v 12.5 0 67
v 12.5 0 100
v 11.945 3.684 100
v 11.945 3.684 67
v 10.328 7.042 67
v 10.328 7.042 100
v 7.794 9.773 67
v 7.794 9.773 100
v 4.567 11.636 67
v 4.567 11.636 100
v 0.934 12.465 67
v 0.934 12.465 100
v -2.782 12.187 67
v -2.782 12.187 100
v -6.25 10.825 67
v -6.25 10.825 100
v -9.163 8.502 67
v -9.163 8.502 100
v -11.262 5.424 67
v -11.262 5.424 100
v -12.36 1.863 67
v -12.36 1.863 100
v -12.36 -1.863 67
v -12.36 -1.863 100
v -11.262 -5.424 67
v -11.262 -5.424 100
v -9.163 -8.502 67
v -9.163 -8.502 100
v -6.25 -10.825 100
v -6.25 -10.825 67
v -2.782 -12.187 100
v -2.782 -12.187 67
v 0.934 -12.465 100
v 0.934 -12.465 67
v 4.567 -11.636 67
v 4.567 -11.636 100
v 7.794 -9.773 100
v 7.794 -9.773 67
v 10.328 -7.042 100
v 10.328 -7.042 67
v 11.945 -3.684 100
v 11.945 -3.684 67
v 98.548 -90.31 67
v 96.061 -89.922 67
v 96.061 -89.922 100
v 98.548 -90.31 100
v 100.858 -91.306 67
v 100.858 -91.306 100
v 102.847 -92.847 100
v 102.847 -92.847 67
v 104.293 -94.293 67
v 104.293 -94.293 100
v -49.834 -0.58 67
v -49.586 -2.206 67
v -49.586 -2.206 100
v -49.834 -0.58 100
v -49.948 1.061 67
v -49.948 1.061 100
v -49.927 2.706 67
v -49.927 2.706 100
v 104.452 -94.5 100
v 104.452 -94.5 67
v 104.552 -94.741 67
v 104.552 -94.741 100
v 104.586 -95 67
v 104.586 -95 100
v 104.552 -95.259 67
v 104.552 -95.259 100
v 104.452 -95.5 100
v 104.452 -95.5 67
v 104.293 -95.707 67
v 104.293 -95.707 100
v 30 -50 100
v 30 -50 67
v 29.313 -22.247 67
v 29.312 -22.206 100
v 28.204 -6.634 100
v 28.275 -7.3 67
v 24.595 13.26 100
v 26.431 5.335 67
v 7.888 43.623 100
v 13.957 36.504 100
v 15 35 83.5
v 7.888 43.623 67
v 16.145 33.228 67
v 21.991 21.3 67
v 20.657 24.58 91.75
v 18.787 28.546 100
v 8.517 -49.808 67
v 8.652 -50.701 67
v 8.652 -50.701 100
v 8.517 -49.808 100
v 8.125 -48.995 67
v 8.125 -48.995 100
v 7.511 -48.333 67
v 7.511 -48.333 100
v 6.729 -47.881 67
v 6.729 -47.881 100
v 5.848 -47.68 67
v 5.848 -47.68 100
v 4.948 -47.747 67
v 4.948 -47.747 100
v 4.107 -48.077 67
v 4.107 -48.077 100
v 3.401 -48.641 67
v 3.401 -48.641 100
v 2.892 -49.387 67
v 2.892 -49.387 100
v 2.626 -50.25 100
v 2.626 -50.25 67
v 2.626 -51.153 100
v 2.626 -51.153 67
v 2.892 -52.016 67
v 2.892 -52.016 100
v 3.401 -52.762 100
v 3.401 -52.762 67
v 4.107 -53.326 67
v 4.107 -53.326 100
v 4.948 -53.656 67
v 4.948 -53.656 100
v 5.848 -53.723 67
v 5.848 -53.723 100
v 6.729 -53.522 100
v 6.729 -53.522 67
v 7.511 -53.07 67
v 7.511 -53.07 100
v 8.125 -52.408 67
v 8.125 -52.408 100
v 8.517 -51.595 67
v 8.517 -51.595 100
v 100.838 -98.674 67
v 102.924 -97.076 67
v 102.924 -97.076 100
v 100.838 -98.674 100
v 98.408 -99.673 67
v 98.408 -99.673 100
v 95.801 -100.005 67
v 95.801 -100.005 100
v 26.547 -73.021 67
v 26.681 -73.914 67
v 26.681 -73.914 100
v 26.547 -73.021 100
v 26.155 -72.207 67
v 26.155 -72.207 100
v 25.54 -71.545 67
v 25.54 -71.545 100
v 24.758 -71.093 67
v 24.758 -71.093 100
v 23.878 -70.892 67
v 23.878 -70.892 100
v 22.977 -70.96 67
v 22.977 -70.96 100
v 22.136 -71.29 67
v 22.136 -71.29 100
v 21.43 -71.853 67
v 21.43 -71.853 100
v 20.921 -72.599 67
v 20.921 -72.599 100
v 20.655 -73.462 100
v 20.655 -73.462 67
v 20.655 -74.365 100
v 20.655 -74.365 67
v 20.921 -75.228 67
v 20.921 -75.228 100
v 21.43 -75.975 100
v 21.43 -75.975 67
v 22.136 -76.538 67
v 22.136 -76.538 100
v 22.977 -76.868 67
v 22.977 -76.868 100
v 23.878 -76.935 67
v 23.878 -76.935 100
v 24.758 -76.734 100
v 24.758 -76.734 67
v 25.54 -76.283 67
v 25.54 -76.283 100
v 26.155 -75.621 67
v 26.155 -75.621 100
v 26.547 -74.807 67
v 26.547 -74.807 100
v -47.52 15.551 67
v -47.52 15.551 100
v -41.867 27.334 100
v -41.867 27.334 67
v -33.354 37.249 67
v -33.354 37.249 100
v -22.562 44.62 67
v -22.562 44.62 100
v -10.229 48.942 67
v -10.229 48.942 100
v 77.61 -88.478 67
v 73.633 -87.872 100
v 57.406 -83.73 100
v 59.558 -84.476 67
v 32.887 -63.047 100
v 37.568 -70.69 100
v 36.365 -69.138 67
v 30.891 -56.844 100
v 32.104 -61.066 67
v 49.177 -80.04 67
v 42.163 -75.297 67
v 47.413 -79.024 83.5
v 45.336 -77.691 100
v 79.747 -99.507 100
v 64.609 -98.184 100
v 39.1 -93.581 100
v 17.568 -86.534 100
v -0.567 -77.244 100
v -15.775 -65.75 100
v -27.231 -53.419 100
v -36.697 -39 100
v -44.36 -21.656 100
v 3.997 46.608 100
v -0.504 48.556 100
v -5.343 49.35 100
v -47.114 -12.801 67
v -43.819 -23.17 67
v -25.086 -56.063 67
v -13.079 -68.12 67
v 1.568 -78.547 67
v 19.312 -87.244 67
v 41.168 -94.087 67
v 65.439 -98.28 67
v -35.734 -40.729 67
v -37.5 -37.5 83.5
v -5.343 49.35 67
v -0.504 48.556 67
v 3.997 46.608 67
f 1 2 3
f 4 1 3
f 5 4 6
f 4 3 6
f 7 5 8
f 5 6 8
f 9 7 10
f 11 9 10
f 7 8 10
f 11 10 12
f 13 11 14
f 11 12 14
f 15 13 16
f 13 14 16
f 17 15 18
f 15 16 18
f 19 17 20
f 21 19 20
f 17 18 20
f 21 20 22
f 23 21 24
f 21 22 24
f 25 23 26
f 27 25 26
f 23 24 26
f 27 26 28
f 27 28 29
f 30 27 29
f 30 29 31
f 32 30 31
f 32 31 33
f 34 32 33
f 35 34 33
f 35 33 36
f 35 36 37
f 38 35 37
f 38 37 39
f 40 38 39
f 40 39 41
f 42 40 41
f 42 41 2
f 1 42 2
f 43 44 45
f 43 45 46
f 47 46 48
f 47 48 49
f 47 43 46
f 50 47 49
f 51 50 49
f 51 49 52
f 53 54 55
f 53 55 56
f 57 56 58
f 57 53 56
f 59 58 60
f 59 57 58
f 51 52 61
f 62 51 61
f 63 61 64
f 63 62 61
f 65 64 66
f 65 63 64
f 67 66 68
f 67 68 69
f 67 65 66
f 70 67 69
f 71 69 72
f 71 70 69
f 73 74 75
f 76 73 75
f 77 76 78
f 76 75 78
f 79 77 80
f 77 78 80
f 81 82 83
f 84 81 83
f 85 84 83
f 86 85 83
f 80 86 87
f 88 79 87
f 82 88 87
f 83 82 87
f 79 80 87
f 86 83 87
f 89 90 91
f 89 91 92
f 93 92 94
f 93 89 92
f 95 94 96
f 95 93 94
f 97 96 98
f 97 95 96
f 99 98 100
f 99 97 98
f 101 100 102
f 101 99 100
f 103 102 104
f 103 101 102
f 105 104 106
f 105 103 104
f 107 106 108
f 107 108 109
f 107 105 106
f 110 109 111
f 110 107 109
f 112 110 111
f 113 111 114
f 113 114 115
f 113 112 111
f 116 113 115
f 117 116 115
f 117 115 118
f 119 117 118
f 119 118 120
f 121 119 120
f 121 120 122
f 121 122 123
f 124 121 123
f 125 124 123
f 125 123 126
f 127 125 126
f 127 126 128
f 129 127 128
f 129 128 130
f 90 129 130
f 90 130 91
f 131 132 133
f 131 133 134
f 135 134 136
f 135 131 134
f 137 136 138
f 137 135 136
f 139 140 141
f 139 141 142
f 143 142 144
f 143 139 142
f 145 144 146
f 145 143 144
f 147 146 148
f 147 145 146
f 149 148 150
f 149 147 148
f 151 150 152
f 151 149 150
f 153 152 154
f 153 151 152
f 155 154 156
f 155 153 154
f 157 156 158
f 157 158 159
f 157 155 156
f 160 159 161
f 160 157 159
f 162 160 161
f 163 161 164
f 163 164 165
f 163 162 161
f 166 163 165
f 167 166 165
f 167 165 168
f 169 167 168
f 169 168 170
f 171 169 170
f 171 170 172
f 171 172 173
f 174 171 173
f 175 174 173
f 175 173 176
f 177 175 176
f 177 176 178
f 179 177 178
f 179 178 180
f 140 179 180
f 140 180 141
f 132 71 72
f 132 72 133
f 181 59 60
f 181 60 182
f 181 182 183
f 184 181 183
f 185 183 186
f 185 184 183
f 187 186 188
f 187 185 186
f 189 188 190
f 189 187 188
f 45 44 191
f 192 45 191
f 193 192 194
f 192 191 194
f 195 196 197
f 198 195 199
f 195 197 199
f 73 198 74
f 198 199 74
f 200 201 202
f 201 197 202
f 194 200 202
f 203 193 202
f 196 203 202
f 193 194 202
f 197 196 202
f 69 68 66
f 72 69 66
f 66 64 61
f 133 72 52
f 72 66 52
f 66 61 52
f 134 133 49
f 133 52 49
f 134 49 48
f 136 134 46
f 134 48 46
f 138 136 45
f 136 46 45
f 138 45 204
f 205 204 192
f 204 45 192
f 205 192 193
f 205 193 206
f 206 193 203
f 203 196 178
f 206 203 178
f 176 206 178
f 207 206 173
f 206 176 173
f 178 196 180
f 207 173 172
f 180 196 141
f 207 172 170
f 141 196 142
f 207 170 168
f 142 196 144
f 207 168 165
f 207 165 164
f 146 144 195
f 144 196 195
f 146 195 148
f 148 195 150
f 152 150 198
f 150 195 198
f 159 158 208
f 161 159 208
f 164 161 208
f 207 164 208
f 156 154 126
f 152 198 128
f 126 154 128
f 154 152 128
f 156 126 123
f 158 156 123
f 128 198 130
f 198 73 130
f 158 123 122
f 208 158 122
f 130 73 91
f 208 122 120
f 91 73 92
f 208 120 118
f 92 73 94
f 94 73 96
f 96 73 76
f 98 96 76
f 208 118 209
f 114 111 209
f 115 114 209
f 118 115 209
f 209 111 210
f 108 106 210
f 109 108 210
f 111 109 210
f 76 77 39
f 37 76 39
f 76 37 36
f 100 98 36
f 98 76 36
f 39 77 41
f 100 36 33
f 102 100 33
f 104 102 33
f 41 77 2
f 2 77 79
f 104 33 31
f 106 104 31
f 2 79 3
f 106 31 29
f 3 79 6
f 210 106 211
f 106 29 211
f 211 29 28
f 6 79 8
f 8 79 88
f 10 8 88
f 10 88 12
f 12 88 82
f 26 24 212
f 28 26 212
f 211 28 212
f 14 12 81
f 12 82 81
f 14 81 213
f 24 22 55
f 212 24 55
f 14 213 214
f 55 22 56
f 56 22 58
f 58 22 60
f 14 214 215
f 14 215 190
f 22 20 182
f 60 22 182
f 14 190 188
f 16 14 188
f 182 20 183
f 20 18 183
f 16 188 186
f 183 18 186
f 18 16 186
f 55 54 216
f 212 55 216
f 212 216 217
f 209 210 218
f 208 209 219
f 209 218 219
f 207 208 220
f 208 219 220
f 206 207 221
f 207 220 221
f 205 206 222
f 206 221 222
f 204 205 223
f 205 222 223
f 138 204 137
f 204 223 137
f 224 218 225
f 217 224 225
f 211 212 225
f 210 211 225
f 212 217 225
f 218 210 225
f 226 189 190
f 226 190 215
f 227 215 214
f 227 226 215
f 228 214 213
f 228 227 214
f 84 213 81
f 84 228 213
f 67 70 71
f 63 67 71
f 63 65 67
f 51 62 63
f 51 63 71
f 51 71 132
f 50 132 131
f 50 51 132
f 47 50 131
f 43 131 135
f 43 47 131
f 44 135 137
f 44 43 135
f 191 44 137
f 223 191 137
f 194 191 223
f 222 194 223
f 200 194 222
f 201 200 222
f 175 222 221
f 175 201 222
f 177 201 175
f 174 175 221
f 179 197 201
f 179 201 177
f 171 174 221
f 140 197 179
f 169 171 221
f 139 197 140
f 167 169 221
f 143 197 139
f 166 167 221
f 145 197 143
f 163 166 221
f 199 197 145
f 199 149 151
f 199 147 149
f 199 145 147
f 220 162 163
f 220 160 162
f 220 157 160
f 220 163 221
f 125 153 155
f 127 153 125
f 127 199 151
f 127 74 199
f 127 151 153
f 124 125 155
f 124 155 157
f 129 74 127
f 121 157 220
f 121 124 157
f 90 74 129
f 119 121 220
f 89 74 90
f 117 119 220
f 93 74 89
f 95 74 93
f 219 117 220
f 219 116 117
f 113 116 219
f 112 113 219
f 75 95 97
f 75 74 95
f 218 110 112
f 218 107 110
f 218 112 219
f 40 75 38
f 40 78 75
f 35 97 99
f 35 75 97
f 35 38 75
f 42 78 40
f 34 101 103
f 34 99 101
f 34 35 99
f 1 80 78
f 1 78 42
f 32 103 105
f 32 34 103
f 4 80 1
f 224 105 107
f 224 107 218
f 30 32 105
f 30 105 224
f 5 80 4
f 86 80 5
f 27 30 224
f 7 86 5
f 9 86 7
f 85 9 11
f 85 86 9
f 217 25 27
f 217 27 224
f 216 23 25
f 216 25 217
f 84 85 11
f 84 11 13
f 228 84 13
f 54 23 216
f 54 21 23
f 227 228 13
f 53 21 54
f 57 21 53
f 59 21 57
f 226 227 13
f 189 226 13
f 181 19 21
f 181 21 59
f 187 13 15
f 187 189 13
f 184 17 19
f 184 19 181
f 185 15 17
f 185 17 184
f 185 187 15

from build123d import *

# Parameters (mm, degrees)
CROQUIS1_R              = 10
SALIENTE_EXTRUIR1_DEPTH = 100
CORTAR_EXTRUIR4_DEPTH   = 15
CROQUIS3_W              = 244.799963401
CROQUIS3_H              = 159.784694376
CORTAR_EXTRUIR5_DEPTH   = 35
CAVIDAD1_START          = 35
CAVIDAD1_OUTLINE_R      = 3.03
CAVIDAD1_DEPTH          = 65
CROQUIS4_R              = 12.5
CORTAR_EXTRUIR6_DEPTH   = 65
CROQUIS5_W              = 213.058099932
CROQUIS5_H              = 195.665601979
CORTAR_EXTRUIR7_DEPTH   = 32


# Read off the part's stored shape, not the designer's step: Cavidad1
with BuildPart() as part:
    # Croquis1 → Saliente-Extruir1 (new body)
    with BuildSketch(Plane.XY):
        with BuildLine():
            Line((102.84709295, -92.84709295), (104.292893219, -94.292893219))
            ThreePointArc((104.292893219, -94.292893219), (104.585786438, -95), (104.292893219, -95.707106781))
            Line((104.292893219, -95.707106781), (102.924090823, -97.075909177))
            ThreePointArc((102.924090823, -97.075909177), (99.655924863, -99.253513567), (95.801242309, -100.004707302))
            add(Edge.make_bspline(
                [(-49.58600728, -2.205776949), (-47.044709507, -15.23286343), (-27.045253615, -73.563310407), (28.636670051, -99.656919769), (95.801242309, -100.004707302)],
                knots=[0.011039812, 0.011039812, 0.011039812, 0.011039812, 0.207725041, 0.983937689, 0.983937689, 0.983937689, 0.983937689], degree=3))
            ThreePointArc((-49.58600728, -2.205776949), (-49.90808847, 0.239585929), (-49.92672205, 2.705998037))
            ThreePointArc((-49.92672205, 2.705998037), (-37.935964584, 32.570885635), (-10.229250857, 48.942439936))
            ThreePointArc((-10.229250857, 48.942439936), (-0.503550938, 48.555514737), (7.88775097, 43.623476385))
            add(Edge.make_bspline(
                [(30, -50), (29.065577858, -23.91659264), (31.451883129, 15.353668912), (10.5535399, 41.001196903), (7.88775097, 43.623476385)],
                knots=[0, 0, 0, 0, 0.805376889, 0.908560603, 0.908560603, 0.908560603, 0.908560603], degree=3))
            add(Edge.make_bspline(
                [(96.061432126, -89.922234449), (74.639632489, -89.310592156), (42.207594165, -82.045244121), (30.598677739, -62.69576919), (30, -50)],
                knots=[0.027764728, 0.027764728, 0.027764728, 0.027764728, 0.487449894, 0.947135059, 0.947135059, 0.947135059, 0.947135059], degree=3))
            ThreePointArc((96.061432126, -89.922234449), (99.734323975, -90.734922209), (102.84709295, -92.84709295))
        make_face()
        Circle(CROQUIS1_R, mode=Mode.SUBTRACT)
    extrude(amount=SALIENTE_EXTRUIR1_DEPTH)

    # Croquis2 → Cortar-Extruir4 (cut)
    with BuildSketch(Plane(origin=(0, 0, 0), x_dir=(-1, 0, 0), z_dir=(0, 0, -1))):
        with BuildLine():
            ThreePointArc((1.102623365, 39.984799883), (1.653330869, 39.965816607), (2.203724614, 39.939248839))
            ThreePointArc((2.203724614, 39.939248839), (3.208029629, 37.678468026), (3.853201686, 35.290265468))
            ThreePointArc((3.853201686, 35.290265468), (4.391380959, 35.227344113), (4.928537187, 35.156215968))
            ThreePointArc((4.928537187, 35.156215968), (6.140272041, 37.312939662), (7.668866774, 39.257973488))
            ThreePointArc((7.668866774, 39.257973488), (8.208938801, 39.148605643), (8.747452981, 39.031808392))
            ThreePointArc((8.747452981, 39.031808392), (9.365948293, 36.63655851), (9.609235823, 34.174736091))
            ThreePointArc((9.609235823, 34.174736091), (10.129718517, 34.024091505), (10.647841327, 33.865520446))
            ThreePointArc((10.647841327, 33.865520446), (12.198034749, 35.793384238), (14.025923488, 37.460291914))
            ThreePointArc((14.025923488, 37.460291914), (14.540628281, 37.263522769), (15.052573634, 37.05968196))
            ThreePointArc((15.052573634, 37.05968196), (15.268388303, 34.595299183), (15.103155055, 32.127009001))
            ThreePointArc((15.103155055, 32.127009001), (15.591743761, 31.892750375), (16.076700112, 31.651061807))
            ThreePointArc((16.076700112, 31.651061807), (17.923066867, 33.297478598), (20.000389573, 34.640791229))
            ThreePointArc((20.000389573, 34.640791229), (20.475687326, 34.361988134), (20.947099317, 34.076664012))
            ThreePointArc((20.947099317, 34.076664012), (20.754346482, 31.610370276), (20.18509959, 29.202940855))
            ThreePointArc((20.18509959, 29.202940855), (20.628466879, 28.891458153), (21.067028427, 28.57324471))
            ThreePointArc((21.067028427, 28.57324471), (23.159204443, 29.893304542), (25.429297167, 30.87638006))
            ThreePointArc((25.429297167, 30.87638006), (25.852222997, 30.523148037), (26.270242736, 30.164123501))
            ThreePointArc((26.270242736, 30.164123501), (25.674180192, 27.763192871), (24.716447225, 25.482292608))
            ThreePointArc((24.716447225, 25.482292608), (25.102499195, 25.102082267), (25.482703124, 24.716023982))
            ThreePointArc((25.482703124, 24.716023982), (27.763619294, 25.673719065), (30.164559823, 26.269741732))
            ThreePointArc((30.164559823, 26.269741732), (30.523577417, 25.85171603), (30.876802415, 25.428784332))
            ThreePointArc((30.876802415, 25.428784332), (29.893689193, 23.158707937), (28.573594612, 21.066553846))
            ThreePointArc((28.573594612, 21.066553846), (28.891800771, 20.627987013), (29.203276108, 20.18461455))
            ThreePointArc((29.203276108, 20.18461455), (31.610714984, 20.753821458), (34.077011921, 20.94653333))
            ThreePointArc((34.077011921, 20.94653333), (34.362328213, 20.4751166), (34.641123413, 19.999814215))
            ThreePointArc((34.641123413, 19.999814215), (33.297776281, 17.922513822), (31.651328823, 16.076174412))
            ThreePointArc((31.651328823, 16.076174412), (31.893009337, 15.591214047), (32.127259848, 15.102621451))
            ThreePointArc((32.127259848, 15.102621451), (34.595552773, 15.267813702), (37.059931966, 15.051958102))
            ThreePointArc((37.059931966, 15.051958102), (37.263764272, 14.540009363), (37.460524868, 14.025301302))
            ThreePointArc((37.460524868, 14.025301302), (35.793586832, 12.197440249), (33.865697293, 10.647278847))
            ThreePointArc((33.865697293, 10.647278847), (34.024259747, 10.129153404), (34.174895688, 9.608668207))
            ThreePointArc((34.174895688, 9.608668207), (36.636714066, 9.365339789), (39.031953674, 8.746804694))
            ThreePointArc((39.031953674, 8.746804694), (39.148741981, 8.208288574), (39.258100856, 7.668214731))
            ThreePointArc((39.258100856, 7.668214731), (37.313041641, 6.139652303), (35.156297822, 4.927953271))
            ThreePointArc((35.156297822, 4.927953271), (35.227417046, 4.390795861), (35.290329461, 3.852615543))
            ThreePointArc((35.290329461, 3.852615543), (37.678521304, 3.20740382), (39.939285436, 2.203061256))
            ThreePointArc((39.939285436, 2.203061256), (39.965844062, 1.65266707), (39.984818192, 1.101959251))
            ThreePointArc((39.984818192, 1.101959251), (37.814693942, -0.085609353), (35.487926192, -0.925794025))
            ThreePointArc((35.487926192, -0.925794025), (35.469662238, -1.467331147), (35.443135042, -2.00852643))
            ThreePointArc((35.443135042, -2.00852643), (37.692556701, -3.038021764), (39.757177604, -4.400775951))
            ThreePointArc((39.757177604, -4.400775951), (39.692782099, -4.948034883), (39.620853919, -5.494354805))
            ThreePointArc((39.620853919, -5.494354805), (37.284859968, -6.308535809), (34.851536446, -6.754288072))
            ThreePointArc((34.851536446, -6.754288072), (34.744387508, -7.285433186), (34.629144292, -7.814881038))
            ThreePointArc((34.629144292, -7.814881038), (36.678437409, -9.200578033), (38.490597607, -10.884571461))
            ThreePointArc((38.490597607, -10.884571461), (38.337004513, -11.413767343), (38.176136036, -11.940797184))
            ThreePointArc((38.176136036, -11.940797184), (35.737992209, -12.359381853), (33.264487636, -12.398542748))
            ThreePointArc((33.264487636, -12.398542748), (33.071376458, -12.904807599), (32.870560757, -13.408066063))
            ThreePointArc((32.870560757, -13.408066063), (34.663825958, -15.112166519), (36.174094444, -17.071464236))
            ThreePointArc((36.174094444, -17.071464236), (35.935493381, -17.568161984), (35.690072679, -18.061525743))
            ThreePointArc((35.690072679, -18.061525743), (33.216285184, -18.073096179), (30.770070318, -17.704597499))
            ThreePointArc((30.770070318, -17.704597499), (30.496264469, -18.172172502), (30.215354012, -18.635513998))
            ThreePointArc((30.215354012, -18.635513998), (31.703675696, -20.611534496), (32.870856284, -22.792691969))
            ThreePointArc((32.870856284, -22.792691969), (32.553755666, -23.243342962), (32.230477177, -23.689582963))
            ThreePointArc((32.230477177, -23.689582963), (29.788524487, -23.293823554), (27.436325694, -22.527716982))
            ThreePointArc((27.436325694, -22.527716982), (27.089293883, -22.94384791), (26.735951175, -23.35463369))
            ThreePointArc((26.735951175, -23.35463369), (27.878731807, -25.548673542), (28.670986852, -27.89219448))
            ThreePointArc((28.670986852, -27.89219448), (28.284036357, -28.284506136), (27.891718275, -28.671450114))
            ThreePointArc((27.891718275, -28.671450114), (25.548210496, -27.879156145), (23.354189625, -26.736339072))
            ThreePointArc((23.354189625, -26.736339072), (22.943397976, -27.089674957), (22.527261285, -27.436699856))
            ThreePointArc((22.527261285, -27.436699856), (23.293328789, -29.788911374), (23.689047639, -32.230870636))
            ThreePointArc((23.689047639, -32.230870636), (23.242802268, -32.554141714), (22.792146008, -32.871234847))
            ThreePointArc((22.792146008, -32.871234847), (20.611007921, -31.704018032), (18.635012143, -30.215663528))
            ThreePointArc((18.635012143, -30.215663528), (18.171665982, -30.496566289), (17.704086432, -30.770364373))
            ThreePointArc((17.704086432, -30.770364373), (18.072544482, -33.216585358), (18.060932958, -35.690372661))
            ThreePointArc((18.060932958, -35.690372661), (17.567565123, -35.935785168), (17.070863412, -36.174377982))
            ThreePointArc((17.070863412, -36.174377982), (15.111590779, -34.664076954), (13.407520108, -32.870783449))
            ThreePointArc((13.407520108, -32.870783449), (12.90425831, -33.071590791), (12.397990251, -33.264693561))
            ThreePointArc((12.397990251, -33.264693561), (12.358788274, -35.738197483), (11.940163108, -38.176334357))
            ThreePointArc((11.940163108, -38.176334357), (11.413130596, -38.337194081), (10.883932163, -38.490778385))
            ThreePointArc((10.883932163, -38.490778385), (9.199968834, -36.678590218), (7.814305875, -34.629274085))
            ThreePointArc((7.814305875, -34.629274085), (7.28485611, -34.744508508), (6.753709216, -34.851648624))
            ThreePointArc((6.753709216, -34.851648624), (6.307916538, -37.284964743), (5.493696735, -39.62094517))
            ThreePointArc((5.493696735, -39.62094517), (4.947375618, -39.692864277), (4.400115616, -39.757250692))
            ThreePointArc((4.400115616, -39.757250692), (3.037395721, -37.692607155), (2.007937749, -35.443168397))
            ThreePointArc((2.007937749, -35.443168397), (1.466742025, -35.469686605), (0.9252046, -35.487941564))
            ThreePointArc((0.9252046, -35.487941564), (0.084981283, -37.814695359), (-1.102623365, -39.984799883))
            ThreePointArc((-1.102623365, -39.984799883), (-1.653330869, -39.965816607), (-2.203724614, -39.939248839))
            ThreePointArc((-2.203724614, -39.939248839), (-3.208029629, -37.678468026), (-3.853201686, -35.290265468))
            ThreePointArc((-3.853201686, -35.290265468), (-4.391380959, -35.227344113), (-4.928537187, -35.156215968))
            ThreePointArc((-4.928537187, -35.156215968), (-6.140272041, -37.312939662), (-7.668866774, -39.257973488))
            ThreePointArc((-7.668866774, -39.257973488), (-8.208938801, -39.148605643), (-8.747452981, -39.031808392))
            ThreePointArc((-8.747452981, -39.031808392), (-9.365948293, -36.63655851), (-9.609235823, -34.174736091))
            ThreePointArc((-9.609235823, -34.174736091), (-10.129718517, -34.024091505), (-10.647841327, -33.865520446))
            ThreePointArc((-10.647841327, -33.865520446), (-12.198034749, -35.793384238), (-14.025923488, -37.460291914))
            ThreePointArc((-14.025923488, -37.460291914), (-14.540628281, -37.263522769), (-15.052573634, -37.05968196))
            ThreePointArc((-15.052573634, -37.05968196), (-15.268388303, -34.595299183), (-15.103155055, -32.127009001))
            ThreePointArc((-15.103155055, -32.127009001), (-15.591743761, -31.892750375), (-16.076700112, -31.651061807))
            ThreePointArc((-16.076700112, -31.651061807), (-17.923066867, -33.297478598), (-20.000389573, -34.640791229))
            ThreePointArc((-20.000389573, -34.640791229), (-20.475687326, -34.361988134), (-20.947099317, -34.076664012))
            ThreePointArc((-20.947099317, -34.076664012), (-20.754346482, -31.610370276), (-20.18509959, -29.202940855))
            ThreePointArc((-20.18509959, -29.202940855), (-20.628466879, -28.891458153), (-21.067028427, -28.57324471))
            ThreePointArc((-21.067028427, -28.57324471), (-23.159204443, -29.893304542), (-25.429297167, -30.87638006))
            ThreePointArc((-25.429297167, -30.87638006), (-25.852222997, -30.523148037), (-26.270242736, -30.164123501))
            ThreePointArc((-26.270242736, -30.164123501), (-25.674180192, -27.763192871), (-24.716447225, -25.482292608))
            ThreePointArc((-24.716447225, -25.482292608), (-25.102499195, -25.102082267), (-25.482703124, -24.716023982))
            ThreePointArc((-25.482703124, -24.716023982), (-27.421409872, -25.555856409), (-29.453588357, -26.133916065))
            add(Edge.make_bspline(
                [(-30, -50), (-29.734872846, -42.599255467), (-29.715262914, -34.495945215), (-29.453588357, -26.133916065)],
                knots=[0, 0, 0, 0, 0.228512653, 0.228512653, 0.228512653, 0.228512653], degree=3))
            add(Edge.make_bspline(
                [(-96.061432126, -89.922234449), (-74.639632489, -89.310592156), (-42.207594165, -82.045244121), (-30.598677739, -62.69576919), (-30, -50)],
                knots=[0.027764728, 0.027764728, 0.027764728, 0.027764728, 0.487449894, 0.947135059, 0.947135059, 0.947135059, 0.947135059], degree=3))
            ThreePointArc((-96.061432126, -89.922234449), (-99.734323975, -90.734922209), (-102.84709295, -92.84709295))
            Line((-102.84709295, -92.84709295), (-104.292893219, -94.292893219))
            ThreePointArc((-104.292893219, -94.292893219), (-104.585786438, -95), (-104.292893219, -95.707106781))
            Line((-104.292893219, -95.707106781), (-102.924090823, -97.075909177))
            ThreePointArc((-102.924090823, -97.075909177), (-99.655924863, -99.253513567), (-95.801242309, -100.004707302))
            add(Edge.make_bspline(
                [(49.58600728, -2.205776949), (47.044709507, -15.23286343), (27.045253615, -73.563310407), (-28.636670051, -99.656919769), (-95.801242309, -100.004707302)],
                knots=[0.011039812, 0.011039812, 0.011039812, 0.011039812, 0.207725041, 0.983937689, 0.983937689, 0.983937689, 0.983937689], degree=3))
            ThreePointArc((49.58600728, -2.205776949), (49.90808847, 0.239585929), (49.92672205, 2.705998037))
            ThreePointArc((49.92672205, 2.705998037), (37.935964584, 32.570885635), (10.229250857, 48.942439936))
            ThreePointArc((10.229250857, 48.942439936), (0.503550938, 48.555514737), (-7.88775097, 43.623476385))
            add(Edge.make_bspline(
                [(-15.182020199, 34.727214957), (-15.121605489, 34.818294405), (-12.99668952, 38.002837294), (-10.5535399, 41.001196903), (-7.88775097, 43.623476385)],
                knots=[0.802344073, 0.802344073, 0.802344073, 0.802344073, 0.805376889, 0.908560603, 0.908560603, 0.908560603, 0.908560603], degree=3))
            ThreePointArc((-15.182020199, 34.727214957), (-14.257602386, 33.834526615), (-13.407520108, 32.870783449))
            ThreePointArc((-13.407520108, 32.870783449), (-12.90425831, 33.071590791), (-12.397990251, 33.264693561))
            ThreePointArc((-12.397990251, 33.264693561), (-12.358788274, 35.738197483), (-11.940163108, 38.176334357))
            ThreePointArc((-11.940163108, 38.176334357), (-11.413130596, 38.337194081), (-10.883932163, 38.490778385))
            ThreePointArc((-10.883932163, 38.490778385), (-9.199968834, 36.678590218), (-7.814305875, 34.629274085))
            ThreePointArc((-7.814305875, 34.629274085), (-7.28485611, 34.744508508), (-6.753709216, 34.851648624))
            ThreePointArc((-6.753709216, 34.851648624), (-6.307916538, 37.284964743), (-5.493696735, 39.62094517))
            ThreePointArc((-5.493696735, 39.62094517), (-4.947375618, 39.692864277), (-4.400115616, 39.757250692))
            ThreePointArc((-4.400115616, 39.757250692), (-3.037395721, 37.692607155), (-2.007937749, 35.443168397))
            ThreePointArc((-2.007937749, 35.443168397), (-1.466742025, 35.469686605), (-0.9252046, 35.487941564))
            ThreePointArc((-0.9252046, 35.487941564), (-0.084981283, 37.814695359), (1.102623365, 39.984799883))
        make_face()
    extrude(amount=-CORTAR_EXTRUIR4_DEPTH, mode=Mode.SUBTRACT)

    # Croquis3 → Cortar-Extruir5 (cut)
    with BuildSketch(Plane(origin=(0, 0, 0), x_dir=(-1, 0, 0), z_dir=(0, 0, -1))):
        with Locations((-26.261343778, -29.231181028)):
            Rectangle(CROQUIS3_W, CROQUIS3_H)
    extrude(amount=-CORTAR_EXTRUIR5_DEPTH, mode=Mode.SUBTRACT)

    # Cavidad1 outline → Cavidad1 (cut)
    with BuildSketch(Plane.XY.offset(CAVIDAD1_START)):
        with Locations((23.651318082, -73.91381178)):
            Circle(CAVIDAD1_OUTLINE_R)
        with Locations((5.62196341, -50.701498074)):
            Circle(CAVIDAD1_OUTLINE_R)
    extrude(amount=CAVIDAD1_DEPTH, mode=Mode.SUBTRACT)

    # Croquis4 → Cortar-Extruir6 (cut)
    with BuildSketch(Plane.XY.offset(100)):
        Circle(CROQUIS4_R)
    extrude(amount=-CORTAR_EXTRUIR6_DEPTH, mode=Mode.SUBTRACT)

    # Croquis5 → Cortar-Extruir7 (cut)
    with BuildSketch(Plane(origin=(7.88775097, 43.623476385, 35), x_dir=(-1, 0, 0), z_dir=(0, 0, -1))):
        with Locations((-26.613557115, -76.115750781)):
            Rectangle(CROQUIS5_W, CROQUIS5_H)
    extrude(amount=-CORTAR_EXTRUIR7_DEPTH, mode=Mode.SUBTRACT)


solid = part.part
